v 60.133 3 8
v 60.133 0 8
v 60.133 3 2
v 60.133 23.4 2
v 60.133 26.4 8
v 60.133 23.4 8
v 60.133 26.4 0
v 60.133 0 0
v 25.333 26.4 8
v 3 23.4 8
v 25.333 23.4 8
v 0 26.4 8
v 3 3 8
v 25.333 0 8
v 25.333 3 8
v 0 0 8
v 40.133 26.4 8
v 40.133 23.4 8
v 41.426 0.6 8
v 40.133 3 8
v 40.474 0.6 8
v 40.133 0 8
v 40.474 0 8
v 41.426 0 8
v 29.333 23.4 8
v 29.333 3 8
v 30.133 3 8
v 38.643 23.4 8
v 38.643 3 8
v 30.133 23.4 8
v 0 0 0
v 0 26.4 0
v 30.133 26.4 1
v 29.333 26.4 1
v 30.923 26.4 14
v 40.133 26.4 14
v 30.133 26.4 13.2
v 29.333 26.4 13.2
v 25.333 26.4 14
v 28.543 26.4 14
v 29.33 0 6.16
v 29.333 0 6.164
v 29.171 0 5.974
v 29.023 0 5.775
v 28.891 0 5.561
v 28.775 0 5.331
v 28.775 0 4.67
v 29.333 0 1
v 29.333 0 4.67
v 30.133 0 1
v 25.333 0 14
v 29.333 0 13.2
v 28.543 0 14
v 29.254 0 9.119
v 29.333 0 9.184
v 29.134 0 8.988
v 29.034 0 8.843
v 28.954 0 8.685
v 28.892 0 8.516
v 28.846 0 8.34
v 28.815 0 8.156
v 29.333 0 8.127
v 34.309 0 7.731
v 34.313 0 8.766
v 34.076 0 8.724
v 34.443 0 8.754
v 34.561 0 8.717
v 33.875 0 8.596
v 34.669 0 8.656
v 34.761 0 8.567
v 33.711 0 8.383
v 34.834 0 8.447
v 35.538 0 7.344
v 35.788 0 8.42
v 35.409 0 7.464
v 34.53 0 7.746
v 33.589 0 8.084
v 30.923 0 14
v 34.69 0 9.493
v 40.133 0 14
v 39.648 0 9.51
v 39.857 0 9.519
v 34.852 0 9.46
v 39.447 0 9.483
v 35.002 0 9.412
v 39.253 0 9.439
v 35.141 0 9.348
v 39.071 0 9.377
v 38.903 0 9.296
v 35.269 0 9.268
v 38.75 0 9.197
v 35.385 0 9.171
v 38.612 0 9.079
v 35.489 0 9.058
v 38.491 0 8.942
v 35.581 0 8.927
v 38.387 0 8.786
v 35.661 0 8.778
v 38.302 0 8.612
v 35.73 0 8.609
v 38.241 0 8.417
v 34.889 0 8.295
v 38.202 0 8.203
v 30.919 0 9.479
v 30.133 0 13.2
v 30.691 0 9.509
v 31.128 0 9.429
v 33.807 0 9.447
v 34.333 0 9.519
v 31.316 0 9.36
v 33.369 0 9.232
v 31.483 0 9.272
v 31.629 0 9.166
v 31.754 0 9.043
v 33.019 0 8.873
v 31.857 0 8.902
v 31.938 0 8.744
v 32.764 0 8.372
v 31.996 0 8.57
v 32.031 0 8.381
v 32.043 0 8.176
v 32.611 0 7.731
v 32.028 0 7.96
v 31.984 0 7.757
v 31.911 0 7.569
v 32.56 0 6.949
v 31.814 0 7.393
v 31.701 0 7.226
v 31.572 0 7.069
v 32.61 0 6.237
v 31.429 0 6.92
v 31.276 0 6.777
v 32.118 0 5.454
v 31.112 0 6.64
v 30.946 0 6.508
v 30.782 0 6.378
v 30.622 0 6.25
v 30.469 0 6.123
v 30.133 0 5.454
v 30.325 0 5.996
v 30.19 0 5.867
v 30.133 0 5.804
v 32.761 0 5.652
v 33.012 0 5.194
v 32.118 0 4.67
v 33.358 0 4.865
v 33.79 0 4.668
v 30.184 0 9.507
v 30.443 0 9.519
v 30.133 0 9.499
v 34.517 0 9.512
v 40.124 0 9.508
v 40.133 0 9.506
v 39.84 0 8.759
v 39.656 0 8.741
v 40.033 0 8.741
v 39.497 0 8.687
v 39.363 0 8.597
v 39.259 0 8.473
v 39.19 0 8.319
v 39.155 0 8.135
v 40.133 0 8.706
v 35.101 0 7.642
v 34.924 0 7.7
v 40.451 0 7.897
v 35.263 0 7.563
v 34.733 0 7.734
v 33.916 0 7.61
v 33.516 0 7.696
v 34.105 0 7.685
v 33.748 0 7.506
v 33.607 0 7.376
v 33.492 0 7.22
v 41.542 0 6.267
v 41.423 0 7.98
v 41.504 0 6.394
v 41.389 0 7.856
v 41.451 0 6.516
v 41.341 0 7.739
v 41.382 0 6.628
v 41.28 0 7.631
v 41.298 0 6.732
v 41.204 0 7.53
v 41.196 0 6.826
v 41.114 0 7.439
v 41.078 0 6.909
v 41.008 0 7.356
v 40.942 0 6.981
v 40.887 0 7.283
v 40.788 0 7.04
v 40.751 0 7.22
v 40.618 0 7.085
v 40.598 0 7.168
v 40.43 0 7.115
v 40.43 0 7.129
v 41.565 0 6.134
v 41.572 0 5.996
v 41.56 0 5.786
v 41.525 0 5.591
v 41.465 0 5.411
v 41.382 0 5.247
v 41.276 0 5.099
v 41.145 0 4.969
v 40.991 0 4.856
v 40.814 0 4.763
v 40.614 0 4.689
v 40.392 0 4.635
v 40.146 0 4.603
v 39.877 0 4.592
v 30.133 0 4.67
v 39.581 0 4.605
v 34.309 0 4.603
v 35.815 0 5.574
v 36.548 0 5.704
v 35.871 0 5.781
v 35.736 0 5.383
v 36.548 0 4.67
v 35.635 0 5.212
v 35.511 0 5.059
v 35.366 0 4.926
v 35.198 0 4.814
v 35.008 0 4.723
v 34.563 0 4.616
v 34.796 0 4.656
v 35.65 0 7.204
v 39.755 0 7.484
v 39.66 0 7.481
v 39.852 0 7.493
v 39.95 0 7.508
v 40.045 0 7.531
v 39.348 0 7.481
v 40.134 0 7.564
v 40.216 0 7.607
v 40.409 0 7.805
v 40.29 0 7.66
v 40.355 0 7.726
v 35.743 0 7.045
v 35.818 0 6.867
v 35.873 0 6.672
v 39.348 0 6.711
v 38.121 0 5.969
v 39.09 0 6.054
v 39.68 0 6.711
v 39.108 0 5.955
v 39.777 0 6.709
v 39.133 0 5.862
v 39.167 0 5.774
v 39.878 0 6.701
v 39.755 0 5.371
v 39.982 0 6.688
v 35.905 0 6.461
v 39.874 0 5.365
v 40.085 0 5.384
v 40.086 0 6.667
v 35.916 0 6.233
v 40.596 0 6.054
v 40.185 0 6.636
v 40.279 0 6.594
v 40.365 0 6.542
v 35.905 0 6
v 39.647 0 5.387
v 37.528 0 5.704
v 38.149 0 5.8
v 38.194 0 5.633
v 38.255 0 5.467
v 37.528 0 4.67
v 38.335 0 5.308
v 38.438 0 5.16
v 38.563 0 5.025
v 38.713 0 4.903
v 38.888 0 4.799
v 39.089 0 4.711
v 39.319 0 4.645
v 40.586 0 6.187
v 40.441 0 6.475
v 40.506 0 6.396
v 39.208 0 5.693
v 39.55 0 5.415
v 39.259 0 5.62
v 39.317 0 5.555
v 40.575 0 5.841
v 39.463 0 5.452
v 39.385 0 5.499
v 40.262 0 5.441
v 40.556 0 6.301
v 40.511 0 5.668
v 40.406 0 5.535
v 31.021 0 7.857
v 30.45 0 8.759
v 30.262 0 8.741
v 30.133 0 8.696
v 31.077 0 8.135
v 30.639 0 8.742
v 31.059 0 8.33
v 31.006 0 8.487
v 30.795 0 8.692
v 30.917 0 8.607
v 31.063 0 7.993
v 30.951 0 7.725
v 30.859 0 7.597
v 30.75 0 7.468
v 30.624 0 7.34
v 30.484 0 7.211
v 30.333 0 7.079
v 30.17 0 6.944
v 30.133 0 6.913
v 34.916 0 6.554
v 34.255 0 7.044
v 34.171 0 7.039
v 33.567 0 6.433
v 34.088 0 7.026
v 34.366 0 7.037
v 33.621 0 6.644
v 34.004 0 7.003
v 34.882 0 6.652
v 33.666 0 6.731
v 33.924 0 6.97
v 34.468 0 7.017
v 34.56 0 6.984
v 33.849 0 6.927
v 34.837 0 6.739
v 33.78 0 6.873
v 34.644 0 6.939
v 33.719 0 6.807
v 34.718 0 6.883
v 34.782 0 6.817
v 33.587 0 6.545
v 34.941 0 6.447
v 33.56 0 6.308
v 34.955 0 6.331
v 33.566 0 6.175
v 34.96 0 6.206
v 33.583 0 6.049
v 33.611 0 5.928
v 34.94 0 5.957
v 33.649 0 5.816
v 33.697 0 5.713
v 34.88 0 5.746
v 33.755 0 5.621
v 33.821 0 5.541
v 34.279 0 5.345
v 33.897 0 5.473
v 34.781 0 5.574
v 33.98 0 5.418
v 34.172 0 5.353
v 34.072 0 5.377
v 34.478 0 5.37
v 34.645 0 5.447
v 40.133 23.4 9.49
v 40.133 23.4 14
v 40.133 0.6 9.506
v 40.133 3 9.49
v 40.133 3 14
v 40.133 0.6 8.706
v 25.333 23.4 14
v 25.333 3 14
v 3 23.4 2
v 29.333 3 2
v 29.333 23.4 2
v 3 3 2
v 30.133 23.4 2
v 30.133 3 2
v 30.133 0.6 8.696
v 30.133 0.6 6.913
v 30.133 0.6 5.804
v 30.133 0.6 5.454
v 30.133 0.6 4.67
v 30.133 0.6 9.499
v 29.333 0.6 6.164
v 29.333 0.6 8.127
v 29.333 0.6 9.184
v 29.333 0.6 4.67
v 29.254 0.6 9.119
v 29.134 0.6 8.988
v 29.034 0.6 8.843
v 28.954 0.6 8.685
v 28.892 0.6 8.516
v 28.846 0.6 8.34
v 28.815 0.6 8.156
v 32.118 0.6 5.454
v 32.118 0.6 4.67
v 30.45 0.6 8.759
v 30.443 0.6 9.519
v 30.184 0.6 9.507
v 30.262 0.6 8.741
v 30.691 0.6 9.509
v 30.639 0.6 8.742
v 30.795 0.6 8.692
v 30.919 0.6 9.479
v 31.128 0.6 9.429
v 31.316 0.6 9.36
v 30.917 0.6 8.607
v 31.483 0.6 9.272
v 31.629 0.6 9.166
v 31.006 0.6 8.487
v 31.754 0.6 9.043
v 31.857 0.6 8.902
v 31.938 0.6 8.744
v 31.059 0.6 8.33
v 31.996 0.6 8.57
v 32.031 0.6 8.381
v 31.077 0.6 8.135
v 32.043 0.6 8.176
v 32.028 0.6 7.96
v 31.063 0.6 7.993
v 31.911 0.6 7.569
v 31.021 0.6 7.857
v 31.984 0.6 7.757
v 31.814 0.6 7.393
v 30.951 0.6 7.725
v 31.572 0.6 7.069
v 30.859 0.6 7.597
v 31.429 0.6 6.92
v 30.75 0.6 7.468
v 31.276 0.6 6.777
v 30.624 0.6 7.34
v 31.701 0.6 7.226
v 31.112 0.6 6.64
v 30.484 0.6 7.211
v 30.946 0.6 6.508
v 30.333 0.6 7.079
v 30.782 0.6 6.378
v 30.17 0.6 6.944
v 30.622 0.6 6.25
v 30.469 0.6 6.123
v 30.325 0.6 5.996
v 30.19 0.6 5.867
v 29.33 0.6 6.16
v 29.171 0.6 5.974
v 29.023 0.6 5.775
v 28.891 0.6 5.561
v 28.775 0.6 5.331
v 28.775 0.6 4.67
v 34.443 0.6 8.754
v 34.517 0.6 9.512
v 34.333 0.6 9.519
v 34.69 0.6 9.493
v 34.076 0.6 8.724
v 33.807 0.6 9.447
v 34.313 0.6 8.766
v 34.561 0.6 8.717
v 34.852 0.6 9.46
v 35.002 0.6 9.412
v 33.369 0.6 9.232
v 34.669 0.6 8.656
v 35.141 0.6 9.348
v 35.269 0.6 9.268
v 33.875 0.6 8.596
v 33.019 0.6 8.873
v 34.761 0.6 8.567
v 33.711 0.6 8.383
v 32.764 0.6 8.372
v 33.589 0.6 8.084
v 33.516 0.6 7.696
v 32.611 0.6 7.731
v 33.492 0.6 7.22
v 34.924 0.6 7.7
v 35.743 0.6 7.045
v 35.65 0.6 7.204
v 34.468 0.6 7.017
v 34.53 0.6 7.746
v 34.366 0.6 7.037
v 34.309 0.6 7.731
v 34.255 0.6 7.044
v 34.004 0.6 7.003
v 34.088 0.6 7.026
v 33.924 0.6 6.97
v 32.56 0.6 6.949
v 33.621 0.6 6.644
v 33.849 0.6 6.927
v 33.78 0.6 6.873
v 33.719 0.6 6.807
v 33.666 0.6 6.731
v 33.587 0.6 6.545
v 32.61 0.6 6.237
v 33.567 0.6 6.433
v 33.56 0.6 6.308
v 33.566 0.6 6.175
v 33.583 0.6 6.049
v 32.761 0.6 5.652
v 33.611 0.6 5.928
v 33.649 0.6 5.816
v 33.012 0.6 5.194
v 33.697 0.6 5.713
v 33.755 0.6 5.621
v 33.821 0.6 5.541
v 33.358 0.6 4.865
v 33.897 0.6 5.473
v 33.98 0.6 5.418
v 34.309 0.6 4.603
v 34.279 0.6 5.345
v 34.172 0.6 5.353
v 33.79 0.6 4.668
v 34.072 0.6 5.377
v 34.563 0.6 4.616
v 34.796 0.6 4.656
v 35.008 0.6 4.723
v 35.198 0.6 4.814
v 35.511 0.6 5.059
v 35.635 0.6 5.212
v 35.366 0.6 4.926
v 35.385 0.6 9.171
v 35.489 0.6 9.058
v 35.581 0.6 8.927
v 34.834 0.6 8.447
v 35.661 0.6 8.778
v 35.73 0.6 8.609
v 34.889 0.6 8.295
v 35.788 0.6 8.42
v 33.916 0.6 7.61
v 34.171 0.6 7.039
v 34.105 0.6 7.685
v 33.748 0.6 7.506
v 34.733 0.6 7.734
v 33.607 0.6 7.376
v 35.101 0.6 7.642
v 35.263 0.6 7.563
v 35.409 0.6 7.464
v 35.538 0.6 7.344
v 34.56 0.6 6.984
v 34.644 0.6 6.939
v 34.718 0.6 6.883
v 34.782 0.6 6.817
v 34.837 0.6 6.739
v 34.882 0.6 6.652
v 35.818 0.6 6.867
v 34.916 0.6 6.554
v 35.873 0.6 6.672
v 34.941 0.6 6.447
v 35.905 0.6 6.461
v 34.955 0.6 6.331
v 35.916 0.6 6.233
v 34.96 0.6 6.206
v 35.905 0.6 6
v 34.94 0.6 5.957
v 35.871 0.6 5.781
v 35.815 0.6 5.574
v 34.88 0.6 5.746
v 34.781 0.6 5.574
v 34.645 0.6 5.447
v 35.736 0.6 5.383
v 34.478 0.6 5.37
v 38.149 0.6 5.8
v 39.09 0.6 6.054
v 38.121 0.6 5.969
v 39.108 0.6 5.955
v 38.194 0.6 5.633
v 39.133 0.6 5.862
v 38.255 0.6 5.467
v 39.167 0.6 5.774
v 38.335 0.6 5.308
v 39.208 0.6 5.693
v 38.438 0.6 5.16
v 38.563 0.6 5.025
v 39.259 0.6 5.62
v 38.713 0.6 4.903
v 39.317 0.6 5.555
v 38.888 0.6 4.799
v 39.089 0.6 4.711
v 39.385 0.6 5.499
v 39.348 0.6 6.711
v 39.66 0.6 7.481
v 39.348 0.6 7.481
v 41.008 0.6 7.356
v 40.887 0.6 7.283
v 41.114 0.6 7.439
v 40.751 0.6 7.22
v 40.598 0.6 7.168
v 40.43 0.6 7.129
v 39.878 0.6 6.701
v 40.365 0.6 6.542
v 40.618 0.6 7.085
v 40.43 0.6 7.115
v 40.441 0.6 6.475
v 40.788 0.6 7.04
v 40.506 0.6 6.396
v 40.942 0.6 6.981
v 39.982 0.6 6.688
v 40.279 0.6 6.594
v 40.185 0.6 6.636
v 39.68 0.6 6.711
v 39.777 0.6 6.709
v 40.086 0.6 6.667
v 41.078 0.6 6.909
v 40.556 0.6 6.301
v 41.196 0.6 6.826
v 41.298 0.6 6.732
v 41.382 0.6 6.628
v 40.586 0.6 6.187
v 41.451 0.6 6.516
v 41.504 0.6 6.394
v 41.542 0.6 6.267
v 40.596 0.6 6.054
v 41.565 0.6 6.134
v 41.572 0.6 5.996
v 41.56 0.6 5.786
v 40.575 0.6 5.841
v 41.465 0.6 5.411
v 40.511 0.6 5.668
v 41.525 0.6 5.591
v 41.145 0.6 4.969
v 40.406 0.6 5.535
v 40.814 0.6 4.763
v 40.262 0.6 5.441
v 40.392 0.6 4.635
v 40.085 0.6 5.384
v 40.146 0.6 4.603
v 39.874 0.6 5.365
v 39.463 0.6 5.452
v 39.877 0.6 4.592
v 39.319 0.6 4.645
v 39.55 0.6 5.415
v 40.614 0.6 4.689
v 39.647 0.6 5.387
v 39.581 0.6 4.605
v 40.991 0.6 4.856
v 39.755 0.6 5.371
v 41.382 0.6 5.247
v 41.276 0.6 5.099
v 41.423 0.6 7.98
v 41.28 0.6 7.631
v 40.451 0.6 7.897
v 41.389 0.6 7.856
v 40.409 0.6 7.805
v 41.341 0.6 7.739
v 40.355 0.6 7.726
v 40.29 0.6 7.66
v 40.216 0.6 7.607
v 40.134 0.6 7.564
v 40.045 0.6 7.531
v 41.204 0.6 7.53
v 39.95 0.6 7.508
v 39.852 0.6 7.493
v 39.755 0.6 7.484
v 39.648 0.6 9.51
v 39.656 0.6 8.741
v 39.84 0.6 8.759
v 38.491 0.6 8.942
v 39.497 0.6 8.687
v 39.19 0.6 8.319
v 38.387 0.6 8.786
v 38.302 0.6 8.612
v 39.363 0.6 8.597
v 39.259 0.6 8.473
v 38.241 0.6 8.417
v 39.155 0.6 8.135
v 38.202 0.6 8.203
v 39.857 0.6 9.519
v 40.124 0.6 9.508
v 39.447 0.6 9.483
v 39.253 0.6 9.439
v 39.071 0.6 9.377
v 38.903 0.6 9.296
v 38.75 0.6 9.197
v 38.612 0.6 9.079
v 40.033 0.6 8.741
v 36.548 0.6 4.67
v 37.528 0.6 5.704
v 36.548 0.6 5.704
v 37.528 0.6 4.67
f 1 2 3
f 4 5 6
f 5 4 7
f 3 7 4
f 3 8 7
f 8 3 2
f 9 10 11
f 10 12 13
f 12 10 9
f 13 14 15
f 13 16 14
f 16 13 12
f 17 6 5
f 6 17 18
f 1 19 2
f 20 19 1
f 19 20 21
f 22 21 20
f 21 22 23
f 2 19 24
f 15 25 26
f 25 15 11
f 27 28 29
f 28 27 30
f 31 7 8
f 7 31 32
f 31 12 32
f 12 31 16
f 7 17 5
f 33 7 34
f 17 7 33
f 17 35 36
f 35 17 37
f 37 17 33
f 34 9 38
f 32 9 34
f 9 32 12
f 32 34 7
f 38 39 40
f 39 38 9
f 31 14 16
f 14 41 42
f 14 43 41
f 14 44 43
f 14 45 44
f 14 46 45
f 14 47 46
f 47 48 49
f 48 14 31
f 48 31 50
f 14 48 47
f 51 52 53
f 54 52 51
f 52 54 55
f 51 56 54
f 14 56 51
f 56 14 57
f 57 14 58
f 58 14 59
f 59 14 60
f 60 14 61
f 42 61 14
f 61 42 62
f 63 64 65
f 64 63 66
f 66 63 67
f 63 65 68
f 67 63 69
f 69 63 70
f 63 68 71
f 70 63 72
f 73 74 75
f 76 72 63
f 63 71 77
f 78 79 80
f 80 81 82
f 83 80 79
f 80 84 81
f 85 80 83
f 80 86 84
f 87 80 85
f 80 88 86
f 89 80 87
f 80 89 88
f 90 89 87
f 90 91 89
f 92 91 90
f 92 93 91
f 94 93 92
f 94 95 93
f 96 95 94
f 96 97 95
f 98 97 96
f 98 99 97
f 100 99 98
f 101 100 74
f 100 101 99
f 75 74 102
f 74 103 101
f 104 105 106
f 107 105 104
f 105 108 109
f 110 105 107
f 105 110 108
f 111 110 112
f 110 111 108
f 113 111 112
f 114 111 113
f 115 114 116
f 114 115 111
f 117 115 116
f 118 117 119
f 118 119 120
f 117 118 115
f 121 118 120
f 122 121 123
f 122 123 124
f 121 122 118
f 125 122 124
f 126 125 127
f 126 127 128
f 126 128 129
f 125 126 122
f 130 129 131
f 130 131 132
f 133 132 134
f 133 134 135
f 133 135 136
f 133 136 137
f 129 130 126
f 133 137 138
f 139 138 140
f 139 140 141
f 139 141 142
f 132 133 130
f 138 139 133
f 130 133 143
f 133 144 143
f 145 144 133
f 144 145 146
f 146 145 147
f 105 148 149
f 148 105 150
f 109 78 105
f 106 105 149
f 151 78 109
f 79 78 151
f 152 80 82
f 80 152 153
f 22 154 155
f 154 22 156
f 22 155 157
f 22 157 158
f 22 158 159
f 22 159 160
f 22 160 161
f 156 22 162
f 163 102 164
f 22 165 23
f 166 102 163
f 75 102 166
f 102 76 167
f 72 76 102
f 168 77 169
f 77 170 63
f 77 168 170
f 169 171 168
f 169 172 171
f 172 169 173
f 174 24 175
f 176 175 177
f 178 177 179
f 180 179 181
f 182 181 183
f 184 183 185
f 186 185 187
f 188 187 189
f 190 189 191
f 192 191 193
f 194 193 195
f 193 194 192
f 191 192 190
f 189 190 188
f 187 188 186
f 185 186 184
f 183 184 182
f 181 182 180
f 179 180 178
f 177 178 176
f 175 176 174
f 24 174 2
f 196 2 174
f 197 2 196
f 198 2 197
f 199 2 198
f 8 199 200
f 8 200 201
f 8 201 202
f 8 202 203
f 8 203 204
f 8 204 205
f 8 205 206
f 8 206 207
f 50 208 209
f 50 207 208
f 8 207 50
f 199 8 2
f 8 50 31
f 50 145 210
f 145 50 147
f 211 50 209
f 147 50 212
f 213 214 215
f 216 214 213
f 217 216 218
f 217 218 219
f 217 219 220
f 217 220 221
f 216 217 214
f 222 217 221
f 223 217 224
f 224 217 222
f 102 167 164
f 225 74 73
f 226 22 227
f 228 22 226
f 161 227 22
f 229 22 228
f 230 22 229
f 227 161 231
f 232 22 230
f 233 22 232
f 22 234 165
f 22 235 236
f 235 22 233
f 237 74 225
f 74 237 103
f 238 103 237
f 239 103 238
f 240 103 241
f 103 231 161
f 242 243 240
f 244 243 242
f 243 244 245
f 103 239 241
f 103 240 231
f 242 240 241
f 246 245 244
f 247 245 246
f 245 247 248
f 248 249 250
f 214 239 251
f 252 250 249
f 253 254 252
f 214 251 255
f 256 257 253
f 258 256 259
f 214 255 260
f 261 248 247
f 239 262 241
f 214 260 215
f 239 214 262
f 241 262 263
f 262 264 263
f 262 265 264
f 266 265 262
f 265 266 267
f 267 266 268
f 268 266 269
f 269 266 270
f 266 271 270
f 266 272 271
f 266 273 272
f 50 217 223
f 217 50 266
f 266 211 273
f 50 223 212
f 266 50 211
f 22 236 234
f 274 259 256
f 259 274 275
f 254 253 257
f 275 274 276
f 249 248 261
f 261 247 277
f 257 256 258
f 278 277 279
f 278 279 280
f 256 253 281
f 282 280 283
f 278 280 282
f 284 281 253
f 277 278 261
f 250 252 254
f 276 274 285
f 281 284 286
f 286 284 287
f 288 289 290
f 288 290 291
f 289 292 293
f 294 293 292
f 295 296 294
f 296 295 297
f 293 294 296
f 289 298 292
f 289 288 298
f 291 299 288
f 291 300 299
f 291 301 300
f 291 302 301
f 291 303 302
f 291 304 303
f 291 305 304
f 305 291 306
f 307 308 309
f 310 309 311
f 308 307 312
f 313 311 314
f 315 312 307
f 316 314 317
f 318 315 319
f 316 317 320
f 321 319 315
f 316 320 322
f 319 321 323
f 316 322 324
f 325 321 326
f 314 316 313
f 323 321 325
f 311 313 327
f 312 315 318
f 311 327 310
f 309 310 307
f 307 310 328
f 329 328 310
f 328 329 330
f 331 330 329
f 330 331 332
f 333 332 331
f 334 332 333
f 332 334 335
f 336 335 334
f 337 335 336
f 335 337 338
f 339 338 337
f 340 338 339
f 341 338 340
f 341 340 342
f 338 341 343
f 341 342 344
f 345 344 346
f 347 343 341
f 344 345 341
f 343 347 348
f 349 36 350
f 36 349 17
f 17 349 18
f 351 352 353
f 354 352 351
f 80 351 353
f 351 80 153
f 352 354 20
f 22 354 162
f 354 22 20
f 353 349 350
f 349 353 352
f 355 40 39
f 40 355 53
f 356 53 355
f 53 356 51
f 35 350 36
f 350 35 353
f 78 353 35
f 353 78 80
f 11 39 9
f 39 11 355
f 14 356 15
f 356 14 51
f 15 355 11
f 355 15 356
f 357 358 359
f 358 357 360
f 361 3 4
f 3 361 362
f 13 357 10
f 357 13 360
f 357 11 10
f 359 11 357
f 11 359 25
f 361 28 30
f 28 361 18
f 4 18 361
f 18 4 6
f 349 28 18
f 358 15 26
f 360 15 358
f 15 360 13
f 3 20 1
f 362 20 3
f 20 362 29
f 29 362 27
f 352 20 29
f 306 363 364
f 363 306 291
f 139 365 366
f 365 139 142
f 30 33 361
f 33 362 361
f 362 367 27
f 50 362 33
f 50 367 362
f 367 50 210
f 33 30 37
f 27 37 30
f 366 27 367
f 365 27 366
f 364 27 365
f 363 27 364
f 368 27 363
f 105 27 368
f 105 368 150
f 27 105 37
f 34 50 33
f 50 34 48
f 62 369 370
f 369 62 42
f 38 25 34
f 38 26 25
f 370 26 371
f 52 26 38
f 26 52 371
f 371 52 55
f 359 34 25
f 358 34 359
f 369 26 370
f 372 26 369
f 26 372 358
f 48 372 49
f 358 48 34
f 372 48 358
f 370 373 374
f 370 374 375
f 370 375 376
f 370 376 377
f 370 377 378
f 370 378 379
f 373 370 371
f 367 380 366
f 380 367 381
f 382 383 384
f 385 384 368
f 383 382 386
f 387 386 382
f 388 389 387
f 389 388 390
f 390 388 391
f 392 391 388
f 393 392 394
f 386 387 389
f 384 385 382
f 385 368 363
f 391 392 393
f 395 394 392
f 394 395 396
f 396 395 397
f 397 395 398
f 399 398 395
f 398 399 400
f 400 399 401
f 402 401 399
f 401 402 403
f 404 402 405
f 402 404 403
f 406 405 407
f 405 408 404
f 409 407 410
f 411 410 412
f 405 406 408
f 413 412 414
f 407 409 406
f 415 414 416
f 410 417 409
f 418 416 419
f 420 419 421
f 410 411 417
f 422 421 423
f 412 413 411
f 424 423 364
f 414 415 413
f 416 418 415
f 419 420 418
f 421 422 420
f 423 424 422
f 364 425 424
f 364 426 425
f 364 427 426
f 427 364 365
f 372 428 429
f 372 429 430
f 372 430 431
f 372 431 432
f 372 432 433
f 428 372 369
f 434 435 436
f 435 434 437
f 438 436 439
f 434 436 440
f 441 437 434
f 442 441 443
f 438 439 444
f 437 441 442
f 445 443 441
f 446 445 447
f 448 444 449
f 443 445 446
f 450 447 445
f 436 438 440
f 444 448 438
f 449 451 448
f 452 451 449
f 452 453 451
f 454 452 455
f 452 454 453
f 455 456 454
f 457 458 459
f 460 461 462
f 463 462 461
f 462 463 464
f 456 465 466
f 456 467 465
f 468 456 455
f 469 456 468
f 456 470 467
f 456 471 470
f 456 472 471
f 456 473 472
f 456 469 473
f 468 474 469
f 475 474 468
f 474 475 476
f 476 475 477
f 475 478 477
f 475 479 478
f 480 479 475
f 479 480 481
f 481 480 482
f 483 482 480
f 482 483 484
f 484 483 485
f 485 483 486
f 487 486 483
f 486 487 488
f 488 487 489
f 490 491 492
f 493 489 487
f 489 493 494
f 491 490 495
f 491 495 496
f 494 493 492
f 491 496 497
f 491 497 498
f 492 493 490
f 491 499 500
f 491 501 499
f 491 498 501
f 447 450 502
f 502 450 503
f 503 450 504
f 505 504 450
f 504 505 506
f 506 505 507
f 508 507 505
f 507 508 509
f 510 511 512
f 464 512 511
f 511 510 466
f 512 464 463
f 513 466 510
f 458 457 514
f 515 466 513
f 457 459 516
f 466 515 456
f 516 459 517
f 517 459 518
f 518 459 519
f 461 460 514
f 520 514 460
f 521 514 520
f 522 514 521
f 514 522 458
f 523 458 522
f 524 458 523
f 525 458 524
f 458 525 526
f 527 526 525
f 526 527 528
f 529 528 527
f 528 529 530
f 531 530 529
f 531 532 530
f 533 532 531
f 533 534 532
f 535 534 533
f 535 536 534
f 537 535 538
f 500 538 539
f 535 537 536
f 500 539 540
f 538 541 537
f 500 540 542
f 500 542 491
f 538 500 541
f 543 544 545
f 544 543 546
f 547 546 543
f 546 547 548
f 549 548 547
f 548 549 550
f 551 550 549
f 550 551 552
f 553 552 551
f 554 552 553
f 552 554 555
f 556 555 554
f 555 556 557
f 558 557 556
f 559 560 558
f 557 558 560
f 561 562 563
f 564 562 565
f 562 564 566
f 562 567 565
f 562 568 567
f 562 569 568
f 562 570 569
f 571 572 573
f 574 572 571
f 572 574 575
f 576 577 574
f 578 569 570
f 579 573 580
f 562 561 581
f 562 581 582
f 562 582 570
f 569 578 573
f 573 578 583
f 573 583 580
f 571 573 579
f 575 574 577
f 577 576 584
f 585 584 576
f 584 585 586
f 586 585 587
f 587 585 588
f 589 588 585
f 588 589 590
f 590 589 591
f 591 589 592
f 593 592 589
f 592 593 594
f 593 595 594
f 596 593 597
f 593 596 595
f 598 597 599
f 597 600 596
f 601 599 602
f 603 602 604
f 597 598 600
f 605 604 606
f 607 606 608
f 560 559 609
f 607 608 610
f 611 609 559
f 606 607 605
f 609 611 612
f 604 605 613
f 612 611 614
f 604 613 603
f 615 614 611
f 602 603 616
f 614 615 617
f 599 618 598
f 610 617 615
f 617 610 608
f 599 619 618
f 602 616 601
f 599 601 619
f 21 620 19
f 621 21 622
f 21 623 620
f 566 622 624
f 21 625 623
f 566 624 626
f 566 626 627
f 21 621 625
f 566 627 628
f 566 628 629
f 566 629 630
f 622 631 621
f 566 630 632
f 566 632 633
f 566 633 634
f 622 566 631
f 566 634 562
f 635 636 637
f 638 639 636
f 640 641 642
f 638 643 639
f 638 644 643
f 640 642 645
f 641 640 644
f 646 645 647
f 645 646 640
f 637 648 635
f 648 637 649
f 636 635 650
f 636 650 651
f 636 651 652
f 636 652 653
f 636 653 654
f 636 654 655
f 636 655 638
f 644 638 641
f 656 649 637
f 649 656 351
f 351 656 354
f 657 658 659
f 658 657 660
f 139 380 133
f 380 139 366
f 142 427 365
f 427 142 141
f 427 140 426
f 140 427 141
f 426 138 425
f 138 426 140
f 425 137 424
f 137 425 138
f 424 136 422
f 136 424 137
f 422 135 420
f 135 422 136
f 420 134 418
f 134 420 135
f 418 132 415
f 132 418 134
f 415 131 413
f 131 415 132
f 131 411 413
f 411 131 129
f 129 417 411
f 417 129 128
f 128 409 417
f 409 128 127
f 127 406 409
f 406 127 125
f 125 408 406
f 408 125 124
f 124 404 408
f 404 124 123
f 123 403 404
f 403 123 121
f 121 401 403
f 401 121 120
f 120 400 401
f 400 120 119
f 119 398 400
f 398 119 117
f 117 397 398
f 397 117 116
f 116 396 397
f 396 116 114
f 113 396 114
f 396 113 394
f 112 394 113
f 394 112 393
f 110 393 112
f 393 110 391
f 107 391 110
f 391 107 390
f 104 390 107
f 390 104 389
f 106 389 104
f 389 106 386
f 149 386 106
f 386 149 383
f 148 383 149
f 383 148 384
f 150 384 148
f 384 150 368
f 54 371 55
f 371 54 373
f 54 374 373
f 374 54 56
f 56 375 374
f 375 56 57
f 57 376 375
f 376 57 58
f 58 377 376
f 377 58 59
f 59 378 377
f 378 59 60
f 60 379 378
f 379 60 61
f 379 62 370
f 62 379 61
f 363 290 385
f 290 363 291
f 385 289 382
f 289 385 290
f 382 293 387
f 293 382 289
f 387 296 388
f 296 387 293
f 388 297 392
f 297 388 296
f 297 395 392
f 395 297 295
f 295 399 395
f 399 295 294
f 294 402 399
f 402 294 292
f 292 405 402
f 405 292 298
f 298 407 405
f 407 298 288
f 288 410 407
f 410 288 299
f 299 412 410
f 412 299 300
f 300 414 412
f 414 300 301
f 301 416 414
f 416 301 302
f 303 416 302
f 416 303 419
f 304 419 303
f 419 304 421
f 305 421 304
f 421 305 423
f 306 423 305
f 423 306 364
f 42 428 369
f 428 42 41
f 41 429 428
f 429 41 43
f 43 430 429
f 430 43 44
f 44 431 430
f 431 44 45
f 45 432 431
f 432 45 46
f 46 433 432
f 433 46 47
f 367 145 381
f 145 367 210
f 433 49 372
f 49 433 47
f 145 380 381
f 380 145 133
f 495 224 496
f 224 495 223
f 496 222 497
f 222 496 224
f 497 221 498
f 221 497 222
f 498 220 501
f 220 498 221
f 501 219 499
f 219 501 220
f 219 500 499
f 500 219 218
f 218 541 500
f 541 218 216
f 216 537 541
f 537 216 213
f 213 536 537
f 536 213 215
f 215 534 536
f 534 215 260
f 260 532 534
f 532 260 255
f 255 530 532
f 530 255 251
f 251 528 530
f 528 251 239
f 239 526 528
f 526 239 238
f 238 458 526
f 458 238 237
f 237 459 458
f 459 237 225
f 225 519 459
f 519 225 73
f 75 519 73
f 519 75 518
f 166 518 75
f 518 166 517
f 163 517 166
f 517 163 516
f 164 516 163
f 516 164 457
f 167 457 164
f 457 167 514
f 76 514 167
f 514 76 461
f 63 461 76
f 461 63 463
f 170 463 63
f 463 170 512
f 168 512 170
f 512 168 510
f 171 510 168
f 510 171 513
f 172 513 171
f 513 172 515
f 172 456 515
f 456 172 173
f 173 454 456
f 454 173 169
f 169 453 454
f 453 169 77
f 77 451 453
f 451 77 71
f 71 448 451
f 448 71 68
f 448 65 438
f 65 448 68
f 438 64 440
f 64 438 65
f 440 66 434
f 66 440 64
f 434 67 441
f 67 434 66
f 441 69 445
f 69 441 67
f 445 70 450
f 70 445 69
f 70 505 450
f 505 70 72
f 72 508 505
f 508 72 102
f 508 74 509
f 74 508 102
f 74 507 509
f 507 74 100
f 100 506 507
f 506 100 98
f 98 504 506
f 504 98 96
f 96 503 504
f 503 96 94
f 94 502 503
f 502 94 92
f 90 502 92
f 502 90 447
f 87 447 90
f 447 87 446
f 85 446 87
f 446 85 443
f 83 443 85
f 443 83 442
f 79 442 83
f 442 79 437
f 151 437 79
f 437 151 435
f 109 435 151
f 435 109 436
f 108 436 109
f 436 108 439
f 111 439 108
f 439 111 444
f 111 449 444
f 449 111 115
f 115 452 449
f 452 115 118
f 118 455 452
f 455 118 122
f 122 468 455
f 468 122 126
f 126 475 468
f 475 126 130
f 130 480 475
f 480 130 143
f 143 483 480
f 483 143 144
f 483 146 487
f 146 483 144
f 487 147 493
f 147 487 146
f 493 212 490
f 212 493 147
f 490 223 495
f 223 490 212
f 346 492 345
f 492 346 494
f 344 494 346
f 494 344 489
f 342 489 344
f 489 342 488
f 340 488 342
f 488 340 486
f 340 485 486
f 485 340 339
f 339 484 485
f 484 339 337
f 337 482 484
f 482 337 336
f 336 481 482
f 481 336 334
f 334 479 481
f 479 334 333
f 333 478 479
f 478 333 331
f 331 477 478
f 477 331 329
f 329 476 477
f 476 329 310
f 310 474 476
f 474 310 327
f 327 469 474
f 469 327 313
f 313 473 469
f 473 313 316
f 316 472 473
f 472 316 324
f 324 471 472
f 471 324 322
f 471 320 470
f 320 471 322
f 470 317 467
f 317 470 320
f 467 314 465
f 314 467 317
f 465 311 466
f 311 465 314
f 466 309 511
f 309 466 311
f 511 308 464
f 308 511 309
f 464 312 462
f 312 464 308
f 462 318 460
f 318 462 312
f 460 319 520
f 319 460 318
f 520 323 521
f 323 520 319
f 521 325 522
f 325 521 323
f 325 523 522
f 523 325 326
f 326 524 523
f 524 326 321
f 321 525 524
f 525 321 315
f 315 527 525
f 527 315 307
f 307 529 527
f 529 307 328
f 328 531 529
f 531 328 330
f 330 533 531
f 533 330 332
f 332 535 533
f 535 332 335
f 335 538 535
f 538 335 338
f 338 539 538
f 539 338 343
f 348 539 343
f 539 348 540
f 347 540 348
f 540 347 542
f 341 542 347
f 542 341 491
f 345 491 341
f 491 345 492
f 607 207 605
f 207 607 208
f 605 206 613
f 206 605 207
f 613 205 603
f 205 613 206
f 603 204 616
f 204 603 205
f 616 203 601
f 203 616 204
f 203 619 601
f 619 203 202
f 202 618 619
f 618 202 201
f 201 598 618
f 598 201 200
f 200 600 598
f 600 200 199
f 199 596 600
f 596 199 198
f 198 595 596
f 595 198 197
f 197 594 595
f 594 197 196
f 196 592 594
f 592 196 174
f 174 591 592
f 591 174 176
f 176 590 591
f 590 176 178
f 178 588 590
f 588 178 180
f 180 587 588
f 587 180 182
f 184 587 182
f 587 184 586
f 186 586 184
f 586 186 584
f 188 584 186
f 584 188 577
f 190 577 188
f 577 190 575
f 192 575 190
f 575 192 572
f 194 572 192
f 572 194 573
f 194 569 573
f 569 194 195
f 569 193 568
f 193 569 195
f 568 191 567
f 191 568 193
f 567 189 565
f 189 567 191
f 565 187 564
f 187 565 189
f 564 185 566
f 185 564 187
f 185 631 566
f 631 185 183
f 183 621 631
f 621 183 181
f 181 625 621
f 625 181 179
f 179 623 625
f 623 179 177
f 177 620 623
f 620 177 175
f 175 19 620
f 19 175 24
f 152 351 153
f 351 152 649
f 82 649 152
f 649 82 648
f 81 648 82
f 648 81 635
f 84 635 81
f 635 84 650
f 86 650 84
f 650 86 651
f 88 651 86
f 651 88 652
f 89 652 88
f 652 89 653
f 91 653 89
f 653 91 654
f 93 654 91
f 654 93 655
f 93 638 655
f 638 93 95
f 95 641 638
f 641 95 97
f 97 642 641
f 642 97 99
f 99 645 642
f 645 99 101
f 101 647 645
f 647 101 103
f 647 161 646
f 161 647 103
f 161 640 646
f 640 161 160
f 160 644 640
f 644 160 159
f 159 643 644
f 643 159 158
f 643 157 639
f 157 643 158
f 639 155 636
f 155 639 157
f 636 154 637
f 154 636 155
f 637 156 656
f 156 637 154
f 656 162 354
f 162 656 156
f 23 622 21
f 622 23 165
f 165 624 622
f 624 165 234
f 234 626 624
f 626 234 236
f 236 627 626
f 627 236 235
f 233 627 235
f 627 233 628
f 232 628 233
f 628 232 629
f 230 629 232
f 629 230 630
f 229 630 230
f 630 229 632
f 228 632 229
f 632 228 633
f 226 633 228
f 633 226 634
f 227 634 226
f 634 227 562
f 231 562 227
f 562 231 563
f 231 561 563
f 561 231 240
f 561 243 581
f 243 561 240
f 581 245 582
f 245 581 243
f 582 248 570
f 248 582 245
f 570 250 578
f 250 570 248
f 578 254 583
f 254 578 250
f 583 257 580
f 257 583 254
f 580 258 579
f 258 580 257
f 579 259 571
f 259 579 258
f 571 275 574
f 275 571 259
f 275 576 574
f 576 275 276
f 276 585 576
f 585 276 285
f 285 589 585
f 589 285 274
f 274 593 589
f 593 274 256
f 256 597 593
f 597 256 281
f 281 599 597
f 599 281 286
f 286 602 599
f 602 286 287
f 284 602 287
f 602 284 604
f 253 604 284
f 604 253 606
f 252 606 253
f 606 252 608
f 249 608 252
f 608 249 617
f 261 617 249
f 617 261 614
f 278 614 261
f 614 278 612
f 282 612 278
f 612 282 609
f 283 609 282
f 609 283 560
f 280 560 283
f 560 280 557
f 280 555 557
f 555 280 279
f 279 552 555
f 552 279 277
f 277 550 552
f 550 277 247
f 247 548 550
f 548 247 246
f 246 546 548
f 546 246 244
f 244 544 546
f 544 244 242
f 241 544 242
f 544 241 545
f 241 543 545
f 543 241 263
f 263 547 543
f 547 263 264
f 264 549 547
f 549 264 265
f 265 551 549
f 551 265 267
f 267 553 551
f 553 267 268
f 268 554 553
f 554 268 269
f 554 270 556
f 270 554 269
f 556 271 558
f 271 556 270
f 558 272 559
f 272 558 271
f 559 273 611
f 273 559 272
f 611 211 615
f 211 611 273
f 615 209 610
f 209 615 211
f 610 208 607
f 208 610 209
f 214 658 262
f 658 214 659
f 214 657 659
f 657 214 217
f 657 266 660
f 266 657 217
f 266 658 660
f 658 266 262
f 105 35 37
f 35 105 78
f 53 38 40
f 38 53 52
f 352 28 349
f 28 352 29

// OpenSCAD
// Cutting jig for Stedi sponge strips (80 x 20 x 5 mm): three equal, square pieces, nothing wasted.
//
// A mitre box. The strip slides along a low channel into the stop. A guide block bridges the channel
// at the cut, with the knife slot through it, so the blade is held for the whole stroke, not just
// where it passes through the side walls. The block's underside sits just above the foam and holds
// it flat while cutting.
//
// Use: push the strip to the stop. Put the blade in the slot, slanted like a normal cut, and pull it
// toward you across the strip, keeping it against the slot face nearest the stop (exactly piece_len
// from the stop). Slide the piece out, push the strip up to the stop, repeat. Three pieces per strip.
// The slot sits (strip_len - 2 kerf)/3 from the stop, so after two cuts the offcut is the same length as
// the first two pieces.
//
//   openscad -o stl/cut_jig.stl cut_jig.scad
//
// Prints floor-down, no supports: the guide block's underside is a 20.4 mm bridge, split by the slot.
// One piece on purpose: slot, wall slots, floor groove and stop stay aligned; a bolt-on guide would add slop.

strip_len  = 80;
kerf       = 0.5;   // material the blade removes per cut (18 mm snap-off blade)
piece_len  = (strip_len - 2*kerf)/3;   // 26.33: three equal pieces
strip_w    = 20;
strip_t    = 5;
clear      = 0.4;   // channel width over the strip: slides freely, no wander
head_clear = 1.0;   // gap between the foam and the guide block's underside (room for bridge sag)
wall       = 3;
floor_t    = 2;
stop_t     = 3;
slot_w     = 0.8;   // 18 mm snap-off blades are 0.5 mm, 9 mm ones 0.38 mm; printed slots come out a bit narrow
groove_d   = 1.0;   // groove in the floor under the slot so the blade cuts right through
guide_h    = 6;     // guide block height above the channel: the depth of slot that holds the blade
guide_near = 4;     // block on the stop side of the slot (short so the cut piece slides out)
guide_far  = 10;    // block on the far side of the slot
run_out    = 30;    // channel past the slot that supports the rest of the strip
label_d    = 0.6;
lead_in    = 0.8;   // chamfer at the top of the slot so the blade drops in
entry_ch   = 1.5;   // chamfer under the block where the strip enters, so foam doesn't catch

cw  = strip_w + clear;                 // channel width
ch  = strip_t + head_clear;            // channel height
L   = stop_t + piece_len + slot_w + run_out;
W   = cw + 2*wall;
xs  = stop_t + piece_len;              // slot face nearest the stop
zt  = floor_t + ch;                    // top of the walls / underside of the guide block
gx0 = xs - guide_near;
gx1 = xs + slot_w + guide_far;

difference() {
  union() {
    cube([L, W, zt]);
    translate([gx0, 0, 0]) cube([gx1 - gx0, W, zt + guide_h]);
  }
  // channel, open at the far end; open on top except under the guide block
  translate([stop_t, wall, floor_t]) cube([L, cw, ch]);
  translate([stop_t, wall, floor_t]) cube([gx0 - stop_t, cw, ch + guide_h + 1]);
  translate([gx1, wall, floor_t]) cube([L, cw, ch + guide_h + 1]);
  // knife slot: through the guide block and both walls, down into the floor groove
  translate([xs, -1, floor_t - groove_d]) cube([slot_w, W + 2, zt + guide_h + 1]);
  // length label on the outside of the guide block, beside the slot (the 14 mm tall face)
  translate([(xs + slot_w + gx1)/2, label_d, (zt + guide_h)/2]) rotate([90, 0, 0])
    linear_extrude(label_d + 1)
      text(str(round(piece_len*10)/10), size = 5, font = "Liberation Sans:style=Bold", halign = "center", valign = "center");
  // slot lead-in: a small V at the top of the guide block
  ztop = zt + guide_h;
  translate([0, -1, 0]) rotate([-90, 0, 0]) linear_extrude(W + 2)
    polygon([[xs - lead_in, -ztop - 0.01], [xs + slot_w + lead_in, -ztop - 0.01],
             [xs + slot_w, -(ztop - lead_in)], [xs, -(ztop - lead_in)]]);
  // entry chamfer under the far edge of the block, across the channel only
  translate([0, wall, 0]) rotate([-90, 0, 0]) linear_extrude(cw)
    polygon([[gx1 + 0.01, -(zt - 0.01)], [gx1 - entry_ch, -(zt - 0.01)], [gx1 + 0.01, -(zt + entry_ch)]]);
}
